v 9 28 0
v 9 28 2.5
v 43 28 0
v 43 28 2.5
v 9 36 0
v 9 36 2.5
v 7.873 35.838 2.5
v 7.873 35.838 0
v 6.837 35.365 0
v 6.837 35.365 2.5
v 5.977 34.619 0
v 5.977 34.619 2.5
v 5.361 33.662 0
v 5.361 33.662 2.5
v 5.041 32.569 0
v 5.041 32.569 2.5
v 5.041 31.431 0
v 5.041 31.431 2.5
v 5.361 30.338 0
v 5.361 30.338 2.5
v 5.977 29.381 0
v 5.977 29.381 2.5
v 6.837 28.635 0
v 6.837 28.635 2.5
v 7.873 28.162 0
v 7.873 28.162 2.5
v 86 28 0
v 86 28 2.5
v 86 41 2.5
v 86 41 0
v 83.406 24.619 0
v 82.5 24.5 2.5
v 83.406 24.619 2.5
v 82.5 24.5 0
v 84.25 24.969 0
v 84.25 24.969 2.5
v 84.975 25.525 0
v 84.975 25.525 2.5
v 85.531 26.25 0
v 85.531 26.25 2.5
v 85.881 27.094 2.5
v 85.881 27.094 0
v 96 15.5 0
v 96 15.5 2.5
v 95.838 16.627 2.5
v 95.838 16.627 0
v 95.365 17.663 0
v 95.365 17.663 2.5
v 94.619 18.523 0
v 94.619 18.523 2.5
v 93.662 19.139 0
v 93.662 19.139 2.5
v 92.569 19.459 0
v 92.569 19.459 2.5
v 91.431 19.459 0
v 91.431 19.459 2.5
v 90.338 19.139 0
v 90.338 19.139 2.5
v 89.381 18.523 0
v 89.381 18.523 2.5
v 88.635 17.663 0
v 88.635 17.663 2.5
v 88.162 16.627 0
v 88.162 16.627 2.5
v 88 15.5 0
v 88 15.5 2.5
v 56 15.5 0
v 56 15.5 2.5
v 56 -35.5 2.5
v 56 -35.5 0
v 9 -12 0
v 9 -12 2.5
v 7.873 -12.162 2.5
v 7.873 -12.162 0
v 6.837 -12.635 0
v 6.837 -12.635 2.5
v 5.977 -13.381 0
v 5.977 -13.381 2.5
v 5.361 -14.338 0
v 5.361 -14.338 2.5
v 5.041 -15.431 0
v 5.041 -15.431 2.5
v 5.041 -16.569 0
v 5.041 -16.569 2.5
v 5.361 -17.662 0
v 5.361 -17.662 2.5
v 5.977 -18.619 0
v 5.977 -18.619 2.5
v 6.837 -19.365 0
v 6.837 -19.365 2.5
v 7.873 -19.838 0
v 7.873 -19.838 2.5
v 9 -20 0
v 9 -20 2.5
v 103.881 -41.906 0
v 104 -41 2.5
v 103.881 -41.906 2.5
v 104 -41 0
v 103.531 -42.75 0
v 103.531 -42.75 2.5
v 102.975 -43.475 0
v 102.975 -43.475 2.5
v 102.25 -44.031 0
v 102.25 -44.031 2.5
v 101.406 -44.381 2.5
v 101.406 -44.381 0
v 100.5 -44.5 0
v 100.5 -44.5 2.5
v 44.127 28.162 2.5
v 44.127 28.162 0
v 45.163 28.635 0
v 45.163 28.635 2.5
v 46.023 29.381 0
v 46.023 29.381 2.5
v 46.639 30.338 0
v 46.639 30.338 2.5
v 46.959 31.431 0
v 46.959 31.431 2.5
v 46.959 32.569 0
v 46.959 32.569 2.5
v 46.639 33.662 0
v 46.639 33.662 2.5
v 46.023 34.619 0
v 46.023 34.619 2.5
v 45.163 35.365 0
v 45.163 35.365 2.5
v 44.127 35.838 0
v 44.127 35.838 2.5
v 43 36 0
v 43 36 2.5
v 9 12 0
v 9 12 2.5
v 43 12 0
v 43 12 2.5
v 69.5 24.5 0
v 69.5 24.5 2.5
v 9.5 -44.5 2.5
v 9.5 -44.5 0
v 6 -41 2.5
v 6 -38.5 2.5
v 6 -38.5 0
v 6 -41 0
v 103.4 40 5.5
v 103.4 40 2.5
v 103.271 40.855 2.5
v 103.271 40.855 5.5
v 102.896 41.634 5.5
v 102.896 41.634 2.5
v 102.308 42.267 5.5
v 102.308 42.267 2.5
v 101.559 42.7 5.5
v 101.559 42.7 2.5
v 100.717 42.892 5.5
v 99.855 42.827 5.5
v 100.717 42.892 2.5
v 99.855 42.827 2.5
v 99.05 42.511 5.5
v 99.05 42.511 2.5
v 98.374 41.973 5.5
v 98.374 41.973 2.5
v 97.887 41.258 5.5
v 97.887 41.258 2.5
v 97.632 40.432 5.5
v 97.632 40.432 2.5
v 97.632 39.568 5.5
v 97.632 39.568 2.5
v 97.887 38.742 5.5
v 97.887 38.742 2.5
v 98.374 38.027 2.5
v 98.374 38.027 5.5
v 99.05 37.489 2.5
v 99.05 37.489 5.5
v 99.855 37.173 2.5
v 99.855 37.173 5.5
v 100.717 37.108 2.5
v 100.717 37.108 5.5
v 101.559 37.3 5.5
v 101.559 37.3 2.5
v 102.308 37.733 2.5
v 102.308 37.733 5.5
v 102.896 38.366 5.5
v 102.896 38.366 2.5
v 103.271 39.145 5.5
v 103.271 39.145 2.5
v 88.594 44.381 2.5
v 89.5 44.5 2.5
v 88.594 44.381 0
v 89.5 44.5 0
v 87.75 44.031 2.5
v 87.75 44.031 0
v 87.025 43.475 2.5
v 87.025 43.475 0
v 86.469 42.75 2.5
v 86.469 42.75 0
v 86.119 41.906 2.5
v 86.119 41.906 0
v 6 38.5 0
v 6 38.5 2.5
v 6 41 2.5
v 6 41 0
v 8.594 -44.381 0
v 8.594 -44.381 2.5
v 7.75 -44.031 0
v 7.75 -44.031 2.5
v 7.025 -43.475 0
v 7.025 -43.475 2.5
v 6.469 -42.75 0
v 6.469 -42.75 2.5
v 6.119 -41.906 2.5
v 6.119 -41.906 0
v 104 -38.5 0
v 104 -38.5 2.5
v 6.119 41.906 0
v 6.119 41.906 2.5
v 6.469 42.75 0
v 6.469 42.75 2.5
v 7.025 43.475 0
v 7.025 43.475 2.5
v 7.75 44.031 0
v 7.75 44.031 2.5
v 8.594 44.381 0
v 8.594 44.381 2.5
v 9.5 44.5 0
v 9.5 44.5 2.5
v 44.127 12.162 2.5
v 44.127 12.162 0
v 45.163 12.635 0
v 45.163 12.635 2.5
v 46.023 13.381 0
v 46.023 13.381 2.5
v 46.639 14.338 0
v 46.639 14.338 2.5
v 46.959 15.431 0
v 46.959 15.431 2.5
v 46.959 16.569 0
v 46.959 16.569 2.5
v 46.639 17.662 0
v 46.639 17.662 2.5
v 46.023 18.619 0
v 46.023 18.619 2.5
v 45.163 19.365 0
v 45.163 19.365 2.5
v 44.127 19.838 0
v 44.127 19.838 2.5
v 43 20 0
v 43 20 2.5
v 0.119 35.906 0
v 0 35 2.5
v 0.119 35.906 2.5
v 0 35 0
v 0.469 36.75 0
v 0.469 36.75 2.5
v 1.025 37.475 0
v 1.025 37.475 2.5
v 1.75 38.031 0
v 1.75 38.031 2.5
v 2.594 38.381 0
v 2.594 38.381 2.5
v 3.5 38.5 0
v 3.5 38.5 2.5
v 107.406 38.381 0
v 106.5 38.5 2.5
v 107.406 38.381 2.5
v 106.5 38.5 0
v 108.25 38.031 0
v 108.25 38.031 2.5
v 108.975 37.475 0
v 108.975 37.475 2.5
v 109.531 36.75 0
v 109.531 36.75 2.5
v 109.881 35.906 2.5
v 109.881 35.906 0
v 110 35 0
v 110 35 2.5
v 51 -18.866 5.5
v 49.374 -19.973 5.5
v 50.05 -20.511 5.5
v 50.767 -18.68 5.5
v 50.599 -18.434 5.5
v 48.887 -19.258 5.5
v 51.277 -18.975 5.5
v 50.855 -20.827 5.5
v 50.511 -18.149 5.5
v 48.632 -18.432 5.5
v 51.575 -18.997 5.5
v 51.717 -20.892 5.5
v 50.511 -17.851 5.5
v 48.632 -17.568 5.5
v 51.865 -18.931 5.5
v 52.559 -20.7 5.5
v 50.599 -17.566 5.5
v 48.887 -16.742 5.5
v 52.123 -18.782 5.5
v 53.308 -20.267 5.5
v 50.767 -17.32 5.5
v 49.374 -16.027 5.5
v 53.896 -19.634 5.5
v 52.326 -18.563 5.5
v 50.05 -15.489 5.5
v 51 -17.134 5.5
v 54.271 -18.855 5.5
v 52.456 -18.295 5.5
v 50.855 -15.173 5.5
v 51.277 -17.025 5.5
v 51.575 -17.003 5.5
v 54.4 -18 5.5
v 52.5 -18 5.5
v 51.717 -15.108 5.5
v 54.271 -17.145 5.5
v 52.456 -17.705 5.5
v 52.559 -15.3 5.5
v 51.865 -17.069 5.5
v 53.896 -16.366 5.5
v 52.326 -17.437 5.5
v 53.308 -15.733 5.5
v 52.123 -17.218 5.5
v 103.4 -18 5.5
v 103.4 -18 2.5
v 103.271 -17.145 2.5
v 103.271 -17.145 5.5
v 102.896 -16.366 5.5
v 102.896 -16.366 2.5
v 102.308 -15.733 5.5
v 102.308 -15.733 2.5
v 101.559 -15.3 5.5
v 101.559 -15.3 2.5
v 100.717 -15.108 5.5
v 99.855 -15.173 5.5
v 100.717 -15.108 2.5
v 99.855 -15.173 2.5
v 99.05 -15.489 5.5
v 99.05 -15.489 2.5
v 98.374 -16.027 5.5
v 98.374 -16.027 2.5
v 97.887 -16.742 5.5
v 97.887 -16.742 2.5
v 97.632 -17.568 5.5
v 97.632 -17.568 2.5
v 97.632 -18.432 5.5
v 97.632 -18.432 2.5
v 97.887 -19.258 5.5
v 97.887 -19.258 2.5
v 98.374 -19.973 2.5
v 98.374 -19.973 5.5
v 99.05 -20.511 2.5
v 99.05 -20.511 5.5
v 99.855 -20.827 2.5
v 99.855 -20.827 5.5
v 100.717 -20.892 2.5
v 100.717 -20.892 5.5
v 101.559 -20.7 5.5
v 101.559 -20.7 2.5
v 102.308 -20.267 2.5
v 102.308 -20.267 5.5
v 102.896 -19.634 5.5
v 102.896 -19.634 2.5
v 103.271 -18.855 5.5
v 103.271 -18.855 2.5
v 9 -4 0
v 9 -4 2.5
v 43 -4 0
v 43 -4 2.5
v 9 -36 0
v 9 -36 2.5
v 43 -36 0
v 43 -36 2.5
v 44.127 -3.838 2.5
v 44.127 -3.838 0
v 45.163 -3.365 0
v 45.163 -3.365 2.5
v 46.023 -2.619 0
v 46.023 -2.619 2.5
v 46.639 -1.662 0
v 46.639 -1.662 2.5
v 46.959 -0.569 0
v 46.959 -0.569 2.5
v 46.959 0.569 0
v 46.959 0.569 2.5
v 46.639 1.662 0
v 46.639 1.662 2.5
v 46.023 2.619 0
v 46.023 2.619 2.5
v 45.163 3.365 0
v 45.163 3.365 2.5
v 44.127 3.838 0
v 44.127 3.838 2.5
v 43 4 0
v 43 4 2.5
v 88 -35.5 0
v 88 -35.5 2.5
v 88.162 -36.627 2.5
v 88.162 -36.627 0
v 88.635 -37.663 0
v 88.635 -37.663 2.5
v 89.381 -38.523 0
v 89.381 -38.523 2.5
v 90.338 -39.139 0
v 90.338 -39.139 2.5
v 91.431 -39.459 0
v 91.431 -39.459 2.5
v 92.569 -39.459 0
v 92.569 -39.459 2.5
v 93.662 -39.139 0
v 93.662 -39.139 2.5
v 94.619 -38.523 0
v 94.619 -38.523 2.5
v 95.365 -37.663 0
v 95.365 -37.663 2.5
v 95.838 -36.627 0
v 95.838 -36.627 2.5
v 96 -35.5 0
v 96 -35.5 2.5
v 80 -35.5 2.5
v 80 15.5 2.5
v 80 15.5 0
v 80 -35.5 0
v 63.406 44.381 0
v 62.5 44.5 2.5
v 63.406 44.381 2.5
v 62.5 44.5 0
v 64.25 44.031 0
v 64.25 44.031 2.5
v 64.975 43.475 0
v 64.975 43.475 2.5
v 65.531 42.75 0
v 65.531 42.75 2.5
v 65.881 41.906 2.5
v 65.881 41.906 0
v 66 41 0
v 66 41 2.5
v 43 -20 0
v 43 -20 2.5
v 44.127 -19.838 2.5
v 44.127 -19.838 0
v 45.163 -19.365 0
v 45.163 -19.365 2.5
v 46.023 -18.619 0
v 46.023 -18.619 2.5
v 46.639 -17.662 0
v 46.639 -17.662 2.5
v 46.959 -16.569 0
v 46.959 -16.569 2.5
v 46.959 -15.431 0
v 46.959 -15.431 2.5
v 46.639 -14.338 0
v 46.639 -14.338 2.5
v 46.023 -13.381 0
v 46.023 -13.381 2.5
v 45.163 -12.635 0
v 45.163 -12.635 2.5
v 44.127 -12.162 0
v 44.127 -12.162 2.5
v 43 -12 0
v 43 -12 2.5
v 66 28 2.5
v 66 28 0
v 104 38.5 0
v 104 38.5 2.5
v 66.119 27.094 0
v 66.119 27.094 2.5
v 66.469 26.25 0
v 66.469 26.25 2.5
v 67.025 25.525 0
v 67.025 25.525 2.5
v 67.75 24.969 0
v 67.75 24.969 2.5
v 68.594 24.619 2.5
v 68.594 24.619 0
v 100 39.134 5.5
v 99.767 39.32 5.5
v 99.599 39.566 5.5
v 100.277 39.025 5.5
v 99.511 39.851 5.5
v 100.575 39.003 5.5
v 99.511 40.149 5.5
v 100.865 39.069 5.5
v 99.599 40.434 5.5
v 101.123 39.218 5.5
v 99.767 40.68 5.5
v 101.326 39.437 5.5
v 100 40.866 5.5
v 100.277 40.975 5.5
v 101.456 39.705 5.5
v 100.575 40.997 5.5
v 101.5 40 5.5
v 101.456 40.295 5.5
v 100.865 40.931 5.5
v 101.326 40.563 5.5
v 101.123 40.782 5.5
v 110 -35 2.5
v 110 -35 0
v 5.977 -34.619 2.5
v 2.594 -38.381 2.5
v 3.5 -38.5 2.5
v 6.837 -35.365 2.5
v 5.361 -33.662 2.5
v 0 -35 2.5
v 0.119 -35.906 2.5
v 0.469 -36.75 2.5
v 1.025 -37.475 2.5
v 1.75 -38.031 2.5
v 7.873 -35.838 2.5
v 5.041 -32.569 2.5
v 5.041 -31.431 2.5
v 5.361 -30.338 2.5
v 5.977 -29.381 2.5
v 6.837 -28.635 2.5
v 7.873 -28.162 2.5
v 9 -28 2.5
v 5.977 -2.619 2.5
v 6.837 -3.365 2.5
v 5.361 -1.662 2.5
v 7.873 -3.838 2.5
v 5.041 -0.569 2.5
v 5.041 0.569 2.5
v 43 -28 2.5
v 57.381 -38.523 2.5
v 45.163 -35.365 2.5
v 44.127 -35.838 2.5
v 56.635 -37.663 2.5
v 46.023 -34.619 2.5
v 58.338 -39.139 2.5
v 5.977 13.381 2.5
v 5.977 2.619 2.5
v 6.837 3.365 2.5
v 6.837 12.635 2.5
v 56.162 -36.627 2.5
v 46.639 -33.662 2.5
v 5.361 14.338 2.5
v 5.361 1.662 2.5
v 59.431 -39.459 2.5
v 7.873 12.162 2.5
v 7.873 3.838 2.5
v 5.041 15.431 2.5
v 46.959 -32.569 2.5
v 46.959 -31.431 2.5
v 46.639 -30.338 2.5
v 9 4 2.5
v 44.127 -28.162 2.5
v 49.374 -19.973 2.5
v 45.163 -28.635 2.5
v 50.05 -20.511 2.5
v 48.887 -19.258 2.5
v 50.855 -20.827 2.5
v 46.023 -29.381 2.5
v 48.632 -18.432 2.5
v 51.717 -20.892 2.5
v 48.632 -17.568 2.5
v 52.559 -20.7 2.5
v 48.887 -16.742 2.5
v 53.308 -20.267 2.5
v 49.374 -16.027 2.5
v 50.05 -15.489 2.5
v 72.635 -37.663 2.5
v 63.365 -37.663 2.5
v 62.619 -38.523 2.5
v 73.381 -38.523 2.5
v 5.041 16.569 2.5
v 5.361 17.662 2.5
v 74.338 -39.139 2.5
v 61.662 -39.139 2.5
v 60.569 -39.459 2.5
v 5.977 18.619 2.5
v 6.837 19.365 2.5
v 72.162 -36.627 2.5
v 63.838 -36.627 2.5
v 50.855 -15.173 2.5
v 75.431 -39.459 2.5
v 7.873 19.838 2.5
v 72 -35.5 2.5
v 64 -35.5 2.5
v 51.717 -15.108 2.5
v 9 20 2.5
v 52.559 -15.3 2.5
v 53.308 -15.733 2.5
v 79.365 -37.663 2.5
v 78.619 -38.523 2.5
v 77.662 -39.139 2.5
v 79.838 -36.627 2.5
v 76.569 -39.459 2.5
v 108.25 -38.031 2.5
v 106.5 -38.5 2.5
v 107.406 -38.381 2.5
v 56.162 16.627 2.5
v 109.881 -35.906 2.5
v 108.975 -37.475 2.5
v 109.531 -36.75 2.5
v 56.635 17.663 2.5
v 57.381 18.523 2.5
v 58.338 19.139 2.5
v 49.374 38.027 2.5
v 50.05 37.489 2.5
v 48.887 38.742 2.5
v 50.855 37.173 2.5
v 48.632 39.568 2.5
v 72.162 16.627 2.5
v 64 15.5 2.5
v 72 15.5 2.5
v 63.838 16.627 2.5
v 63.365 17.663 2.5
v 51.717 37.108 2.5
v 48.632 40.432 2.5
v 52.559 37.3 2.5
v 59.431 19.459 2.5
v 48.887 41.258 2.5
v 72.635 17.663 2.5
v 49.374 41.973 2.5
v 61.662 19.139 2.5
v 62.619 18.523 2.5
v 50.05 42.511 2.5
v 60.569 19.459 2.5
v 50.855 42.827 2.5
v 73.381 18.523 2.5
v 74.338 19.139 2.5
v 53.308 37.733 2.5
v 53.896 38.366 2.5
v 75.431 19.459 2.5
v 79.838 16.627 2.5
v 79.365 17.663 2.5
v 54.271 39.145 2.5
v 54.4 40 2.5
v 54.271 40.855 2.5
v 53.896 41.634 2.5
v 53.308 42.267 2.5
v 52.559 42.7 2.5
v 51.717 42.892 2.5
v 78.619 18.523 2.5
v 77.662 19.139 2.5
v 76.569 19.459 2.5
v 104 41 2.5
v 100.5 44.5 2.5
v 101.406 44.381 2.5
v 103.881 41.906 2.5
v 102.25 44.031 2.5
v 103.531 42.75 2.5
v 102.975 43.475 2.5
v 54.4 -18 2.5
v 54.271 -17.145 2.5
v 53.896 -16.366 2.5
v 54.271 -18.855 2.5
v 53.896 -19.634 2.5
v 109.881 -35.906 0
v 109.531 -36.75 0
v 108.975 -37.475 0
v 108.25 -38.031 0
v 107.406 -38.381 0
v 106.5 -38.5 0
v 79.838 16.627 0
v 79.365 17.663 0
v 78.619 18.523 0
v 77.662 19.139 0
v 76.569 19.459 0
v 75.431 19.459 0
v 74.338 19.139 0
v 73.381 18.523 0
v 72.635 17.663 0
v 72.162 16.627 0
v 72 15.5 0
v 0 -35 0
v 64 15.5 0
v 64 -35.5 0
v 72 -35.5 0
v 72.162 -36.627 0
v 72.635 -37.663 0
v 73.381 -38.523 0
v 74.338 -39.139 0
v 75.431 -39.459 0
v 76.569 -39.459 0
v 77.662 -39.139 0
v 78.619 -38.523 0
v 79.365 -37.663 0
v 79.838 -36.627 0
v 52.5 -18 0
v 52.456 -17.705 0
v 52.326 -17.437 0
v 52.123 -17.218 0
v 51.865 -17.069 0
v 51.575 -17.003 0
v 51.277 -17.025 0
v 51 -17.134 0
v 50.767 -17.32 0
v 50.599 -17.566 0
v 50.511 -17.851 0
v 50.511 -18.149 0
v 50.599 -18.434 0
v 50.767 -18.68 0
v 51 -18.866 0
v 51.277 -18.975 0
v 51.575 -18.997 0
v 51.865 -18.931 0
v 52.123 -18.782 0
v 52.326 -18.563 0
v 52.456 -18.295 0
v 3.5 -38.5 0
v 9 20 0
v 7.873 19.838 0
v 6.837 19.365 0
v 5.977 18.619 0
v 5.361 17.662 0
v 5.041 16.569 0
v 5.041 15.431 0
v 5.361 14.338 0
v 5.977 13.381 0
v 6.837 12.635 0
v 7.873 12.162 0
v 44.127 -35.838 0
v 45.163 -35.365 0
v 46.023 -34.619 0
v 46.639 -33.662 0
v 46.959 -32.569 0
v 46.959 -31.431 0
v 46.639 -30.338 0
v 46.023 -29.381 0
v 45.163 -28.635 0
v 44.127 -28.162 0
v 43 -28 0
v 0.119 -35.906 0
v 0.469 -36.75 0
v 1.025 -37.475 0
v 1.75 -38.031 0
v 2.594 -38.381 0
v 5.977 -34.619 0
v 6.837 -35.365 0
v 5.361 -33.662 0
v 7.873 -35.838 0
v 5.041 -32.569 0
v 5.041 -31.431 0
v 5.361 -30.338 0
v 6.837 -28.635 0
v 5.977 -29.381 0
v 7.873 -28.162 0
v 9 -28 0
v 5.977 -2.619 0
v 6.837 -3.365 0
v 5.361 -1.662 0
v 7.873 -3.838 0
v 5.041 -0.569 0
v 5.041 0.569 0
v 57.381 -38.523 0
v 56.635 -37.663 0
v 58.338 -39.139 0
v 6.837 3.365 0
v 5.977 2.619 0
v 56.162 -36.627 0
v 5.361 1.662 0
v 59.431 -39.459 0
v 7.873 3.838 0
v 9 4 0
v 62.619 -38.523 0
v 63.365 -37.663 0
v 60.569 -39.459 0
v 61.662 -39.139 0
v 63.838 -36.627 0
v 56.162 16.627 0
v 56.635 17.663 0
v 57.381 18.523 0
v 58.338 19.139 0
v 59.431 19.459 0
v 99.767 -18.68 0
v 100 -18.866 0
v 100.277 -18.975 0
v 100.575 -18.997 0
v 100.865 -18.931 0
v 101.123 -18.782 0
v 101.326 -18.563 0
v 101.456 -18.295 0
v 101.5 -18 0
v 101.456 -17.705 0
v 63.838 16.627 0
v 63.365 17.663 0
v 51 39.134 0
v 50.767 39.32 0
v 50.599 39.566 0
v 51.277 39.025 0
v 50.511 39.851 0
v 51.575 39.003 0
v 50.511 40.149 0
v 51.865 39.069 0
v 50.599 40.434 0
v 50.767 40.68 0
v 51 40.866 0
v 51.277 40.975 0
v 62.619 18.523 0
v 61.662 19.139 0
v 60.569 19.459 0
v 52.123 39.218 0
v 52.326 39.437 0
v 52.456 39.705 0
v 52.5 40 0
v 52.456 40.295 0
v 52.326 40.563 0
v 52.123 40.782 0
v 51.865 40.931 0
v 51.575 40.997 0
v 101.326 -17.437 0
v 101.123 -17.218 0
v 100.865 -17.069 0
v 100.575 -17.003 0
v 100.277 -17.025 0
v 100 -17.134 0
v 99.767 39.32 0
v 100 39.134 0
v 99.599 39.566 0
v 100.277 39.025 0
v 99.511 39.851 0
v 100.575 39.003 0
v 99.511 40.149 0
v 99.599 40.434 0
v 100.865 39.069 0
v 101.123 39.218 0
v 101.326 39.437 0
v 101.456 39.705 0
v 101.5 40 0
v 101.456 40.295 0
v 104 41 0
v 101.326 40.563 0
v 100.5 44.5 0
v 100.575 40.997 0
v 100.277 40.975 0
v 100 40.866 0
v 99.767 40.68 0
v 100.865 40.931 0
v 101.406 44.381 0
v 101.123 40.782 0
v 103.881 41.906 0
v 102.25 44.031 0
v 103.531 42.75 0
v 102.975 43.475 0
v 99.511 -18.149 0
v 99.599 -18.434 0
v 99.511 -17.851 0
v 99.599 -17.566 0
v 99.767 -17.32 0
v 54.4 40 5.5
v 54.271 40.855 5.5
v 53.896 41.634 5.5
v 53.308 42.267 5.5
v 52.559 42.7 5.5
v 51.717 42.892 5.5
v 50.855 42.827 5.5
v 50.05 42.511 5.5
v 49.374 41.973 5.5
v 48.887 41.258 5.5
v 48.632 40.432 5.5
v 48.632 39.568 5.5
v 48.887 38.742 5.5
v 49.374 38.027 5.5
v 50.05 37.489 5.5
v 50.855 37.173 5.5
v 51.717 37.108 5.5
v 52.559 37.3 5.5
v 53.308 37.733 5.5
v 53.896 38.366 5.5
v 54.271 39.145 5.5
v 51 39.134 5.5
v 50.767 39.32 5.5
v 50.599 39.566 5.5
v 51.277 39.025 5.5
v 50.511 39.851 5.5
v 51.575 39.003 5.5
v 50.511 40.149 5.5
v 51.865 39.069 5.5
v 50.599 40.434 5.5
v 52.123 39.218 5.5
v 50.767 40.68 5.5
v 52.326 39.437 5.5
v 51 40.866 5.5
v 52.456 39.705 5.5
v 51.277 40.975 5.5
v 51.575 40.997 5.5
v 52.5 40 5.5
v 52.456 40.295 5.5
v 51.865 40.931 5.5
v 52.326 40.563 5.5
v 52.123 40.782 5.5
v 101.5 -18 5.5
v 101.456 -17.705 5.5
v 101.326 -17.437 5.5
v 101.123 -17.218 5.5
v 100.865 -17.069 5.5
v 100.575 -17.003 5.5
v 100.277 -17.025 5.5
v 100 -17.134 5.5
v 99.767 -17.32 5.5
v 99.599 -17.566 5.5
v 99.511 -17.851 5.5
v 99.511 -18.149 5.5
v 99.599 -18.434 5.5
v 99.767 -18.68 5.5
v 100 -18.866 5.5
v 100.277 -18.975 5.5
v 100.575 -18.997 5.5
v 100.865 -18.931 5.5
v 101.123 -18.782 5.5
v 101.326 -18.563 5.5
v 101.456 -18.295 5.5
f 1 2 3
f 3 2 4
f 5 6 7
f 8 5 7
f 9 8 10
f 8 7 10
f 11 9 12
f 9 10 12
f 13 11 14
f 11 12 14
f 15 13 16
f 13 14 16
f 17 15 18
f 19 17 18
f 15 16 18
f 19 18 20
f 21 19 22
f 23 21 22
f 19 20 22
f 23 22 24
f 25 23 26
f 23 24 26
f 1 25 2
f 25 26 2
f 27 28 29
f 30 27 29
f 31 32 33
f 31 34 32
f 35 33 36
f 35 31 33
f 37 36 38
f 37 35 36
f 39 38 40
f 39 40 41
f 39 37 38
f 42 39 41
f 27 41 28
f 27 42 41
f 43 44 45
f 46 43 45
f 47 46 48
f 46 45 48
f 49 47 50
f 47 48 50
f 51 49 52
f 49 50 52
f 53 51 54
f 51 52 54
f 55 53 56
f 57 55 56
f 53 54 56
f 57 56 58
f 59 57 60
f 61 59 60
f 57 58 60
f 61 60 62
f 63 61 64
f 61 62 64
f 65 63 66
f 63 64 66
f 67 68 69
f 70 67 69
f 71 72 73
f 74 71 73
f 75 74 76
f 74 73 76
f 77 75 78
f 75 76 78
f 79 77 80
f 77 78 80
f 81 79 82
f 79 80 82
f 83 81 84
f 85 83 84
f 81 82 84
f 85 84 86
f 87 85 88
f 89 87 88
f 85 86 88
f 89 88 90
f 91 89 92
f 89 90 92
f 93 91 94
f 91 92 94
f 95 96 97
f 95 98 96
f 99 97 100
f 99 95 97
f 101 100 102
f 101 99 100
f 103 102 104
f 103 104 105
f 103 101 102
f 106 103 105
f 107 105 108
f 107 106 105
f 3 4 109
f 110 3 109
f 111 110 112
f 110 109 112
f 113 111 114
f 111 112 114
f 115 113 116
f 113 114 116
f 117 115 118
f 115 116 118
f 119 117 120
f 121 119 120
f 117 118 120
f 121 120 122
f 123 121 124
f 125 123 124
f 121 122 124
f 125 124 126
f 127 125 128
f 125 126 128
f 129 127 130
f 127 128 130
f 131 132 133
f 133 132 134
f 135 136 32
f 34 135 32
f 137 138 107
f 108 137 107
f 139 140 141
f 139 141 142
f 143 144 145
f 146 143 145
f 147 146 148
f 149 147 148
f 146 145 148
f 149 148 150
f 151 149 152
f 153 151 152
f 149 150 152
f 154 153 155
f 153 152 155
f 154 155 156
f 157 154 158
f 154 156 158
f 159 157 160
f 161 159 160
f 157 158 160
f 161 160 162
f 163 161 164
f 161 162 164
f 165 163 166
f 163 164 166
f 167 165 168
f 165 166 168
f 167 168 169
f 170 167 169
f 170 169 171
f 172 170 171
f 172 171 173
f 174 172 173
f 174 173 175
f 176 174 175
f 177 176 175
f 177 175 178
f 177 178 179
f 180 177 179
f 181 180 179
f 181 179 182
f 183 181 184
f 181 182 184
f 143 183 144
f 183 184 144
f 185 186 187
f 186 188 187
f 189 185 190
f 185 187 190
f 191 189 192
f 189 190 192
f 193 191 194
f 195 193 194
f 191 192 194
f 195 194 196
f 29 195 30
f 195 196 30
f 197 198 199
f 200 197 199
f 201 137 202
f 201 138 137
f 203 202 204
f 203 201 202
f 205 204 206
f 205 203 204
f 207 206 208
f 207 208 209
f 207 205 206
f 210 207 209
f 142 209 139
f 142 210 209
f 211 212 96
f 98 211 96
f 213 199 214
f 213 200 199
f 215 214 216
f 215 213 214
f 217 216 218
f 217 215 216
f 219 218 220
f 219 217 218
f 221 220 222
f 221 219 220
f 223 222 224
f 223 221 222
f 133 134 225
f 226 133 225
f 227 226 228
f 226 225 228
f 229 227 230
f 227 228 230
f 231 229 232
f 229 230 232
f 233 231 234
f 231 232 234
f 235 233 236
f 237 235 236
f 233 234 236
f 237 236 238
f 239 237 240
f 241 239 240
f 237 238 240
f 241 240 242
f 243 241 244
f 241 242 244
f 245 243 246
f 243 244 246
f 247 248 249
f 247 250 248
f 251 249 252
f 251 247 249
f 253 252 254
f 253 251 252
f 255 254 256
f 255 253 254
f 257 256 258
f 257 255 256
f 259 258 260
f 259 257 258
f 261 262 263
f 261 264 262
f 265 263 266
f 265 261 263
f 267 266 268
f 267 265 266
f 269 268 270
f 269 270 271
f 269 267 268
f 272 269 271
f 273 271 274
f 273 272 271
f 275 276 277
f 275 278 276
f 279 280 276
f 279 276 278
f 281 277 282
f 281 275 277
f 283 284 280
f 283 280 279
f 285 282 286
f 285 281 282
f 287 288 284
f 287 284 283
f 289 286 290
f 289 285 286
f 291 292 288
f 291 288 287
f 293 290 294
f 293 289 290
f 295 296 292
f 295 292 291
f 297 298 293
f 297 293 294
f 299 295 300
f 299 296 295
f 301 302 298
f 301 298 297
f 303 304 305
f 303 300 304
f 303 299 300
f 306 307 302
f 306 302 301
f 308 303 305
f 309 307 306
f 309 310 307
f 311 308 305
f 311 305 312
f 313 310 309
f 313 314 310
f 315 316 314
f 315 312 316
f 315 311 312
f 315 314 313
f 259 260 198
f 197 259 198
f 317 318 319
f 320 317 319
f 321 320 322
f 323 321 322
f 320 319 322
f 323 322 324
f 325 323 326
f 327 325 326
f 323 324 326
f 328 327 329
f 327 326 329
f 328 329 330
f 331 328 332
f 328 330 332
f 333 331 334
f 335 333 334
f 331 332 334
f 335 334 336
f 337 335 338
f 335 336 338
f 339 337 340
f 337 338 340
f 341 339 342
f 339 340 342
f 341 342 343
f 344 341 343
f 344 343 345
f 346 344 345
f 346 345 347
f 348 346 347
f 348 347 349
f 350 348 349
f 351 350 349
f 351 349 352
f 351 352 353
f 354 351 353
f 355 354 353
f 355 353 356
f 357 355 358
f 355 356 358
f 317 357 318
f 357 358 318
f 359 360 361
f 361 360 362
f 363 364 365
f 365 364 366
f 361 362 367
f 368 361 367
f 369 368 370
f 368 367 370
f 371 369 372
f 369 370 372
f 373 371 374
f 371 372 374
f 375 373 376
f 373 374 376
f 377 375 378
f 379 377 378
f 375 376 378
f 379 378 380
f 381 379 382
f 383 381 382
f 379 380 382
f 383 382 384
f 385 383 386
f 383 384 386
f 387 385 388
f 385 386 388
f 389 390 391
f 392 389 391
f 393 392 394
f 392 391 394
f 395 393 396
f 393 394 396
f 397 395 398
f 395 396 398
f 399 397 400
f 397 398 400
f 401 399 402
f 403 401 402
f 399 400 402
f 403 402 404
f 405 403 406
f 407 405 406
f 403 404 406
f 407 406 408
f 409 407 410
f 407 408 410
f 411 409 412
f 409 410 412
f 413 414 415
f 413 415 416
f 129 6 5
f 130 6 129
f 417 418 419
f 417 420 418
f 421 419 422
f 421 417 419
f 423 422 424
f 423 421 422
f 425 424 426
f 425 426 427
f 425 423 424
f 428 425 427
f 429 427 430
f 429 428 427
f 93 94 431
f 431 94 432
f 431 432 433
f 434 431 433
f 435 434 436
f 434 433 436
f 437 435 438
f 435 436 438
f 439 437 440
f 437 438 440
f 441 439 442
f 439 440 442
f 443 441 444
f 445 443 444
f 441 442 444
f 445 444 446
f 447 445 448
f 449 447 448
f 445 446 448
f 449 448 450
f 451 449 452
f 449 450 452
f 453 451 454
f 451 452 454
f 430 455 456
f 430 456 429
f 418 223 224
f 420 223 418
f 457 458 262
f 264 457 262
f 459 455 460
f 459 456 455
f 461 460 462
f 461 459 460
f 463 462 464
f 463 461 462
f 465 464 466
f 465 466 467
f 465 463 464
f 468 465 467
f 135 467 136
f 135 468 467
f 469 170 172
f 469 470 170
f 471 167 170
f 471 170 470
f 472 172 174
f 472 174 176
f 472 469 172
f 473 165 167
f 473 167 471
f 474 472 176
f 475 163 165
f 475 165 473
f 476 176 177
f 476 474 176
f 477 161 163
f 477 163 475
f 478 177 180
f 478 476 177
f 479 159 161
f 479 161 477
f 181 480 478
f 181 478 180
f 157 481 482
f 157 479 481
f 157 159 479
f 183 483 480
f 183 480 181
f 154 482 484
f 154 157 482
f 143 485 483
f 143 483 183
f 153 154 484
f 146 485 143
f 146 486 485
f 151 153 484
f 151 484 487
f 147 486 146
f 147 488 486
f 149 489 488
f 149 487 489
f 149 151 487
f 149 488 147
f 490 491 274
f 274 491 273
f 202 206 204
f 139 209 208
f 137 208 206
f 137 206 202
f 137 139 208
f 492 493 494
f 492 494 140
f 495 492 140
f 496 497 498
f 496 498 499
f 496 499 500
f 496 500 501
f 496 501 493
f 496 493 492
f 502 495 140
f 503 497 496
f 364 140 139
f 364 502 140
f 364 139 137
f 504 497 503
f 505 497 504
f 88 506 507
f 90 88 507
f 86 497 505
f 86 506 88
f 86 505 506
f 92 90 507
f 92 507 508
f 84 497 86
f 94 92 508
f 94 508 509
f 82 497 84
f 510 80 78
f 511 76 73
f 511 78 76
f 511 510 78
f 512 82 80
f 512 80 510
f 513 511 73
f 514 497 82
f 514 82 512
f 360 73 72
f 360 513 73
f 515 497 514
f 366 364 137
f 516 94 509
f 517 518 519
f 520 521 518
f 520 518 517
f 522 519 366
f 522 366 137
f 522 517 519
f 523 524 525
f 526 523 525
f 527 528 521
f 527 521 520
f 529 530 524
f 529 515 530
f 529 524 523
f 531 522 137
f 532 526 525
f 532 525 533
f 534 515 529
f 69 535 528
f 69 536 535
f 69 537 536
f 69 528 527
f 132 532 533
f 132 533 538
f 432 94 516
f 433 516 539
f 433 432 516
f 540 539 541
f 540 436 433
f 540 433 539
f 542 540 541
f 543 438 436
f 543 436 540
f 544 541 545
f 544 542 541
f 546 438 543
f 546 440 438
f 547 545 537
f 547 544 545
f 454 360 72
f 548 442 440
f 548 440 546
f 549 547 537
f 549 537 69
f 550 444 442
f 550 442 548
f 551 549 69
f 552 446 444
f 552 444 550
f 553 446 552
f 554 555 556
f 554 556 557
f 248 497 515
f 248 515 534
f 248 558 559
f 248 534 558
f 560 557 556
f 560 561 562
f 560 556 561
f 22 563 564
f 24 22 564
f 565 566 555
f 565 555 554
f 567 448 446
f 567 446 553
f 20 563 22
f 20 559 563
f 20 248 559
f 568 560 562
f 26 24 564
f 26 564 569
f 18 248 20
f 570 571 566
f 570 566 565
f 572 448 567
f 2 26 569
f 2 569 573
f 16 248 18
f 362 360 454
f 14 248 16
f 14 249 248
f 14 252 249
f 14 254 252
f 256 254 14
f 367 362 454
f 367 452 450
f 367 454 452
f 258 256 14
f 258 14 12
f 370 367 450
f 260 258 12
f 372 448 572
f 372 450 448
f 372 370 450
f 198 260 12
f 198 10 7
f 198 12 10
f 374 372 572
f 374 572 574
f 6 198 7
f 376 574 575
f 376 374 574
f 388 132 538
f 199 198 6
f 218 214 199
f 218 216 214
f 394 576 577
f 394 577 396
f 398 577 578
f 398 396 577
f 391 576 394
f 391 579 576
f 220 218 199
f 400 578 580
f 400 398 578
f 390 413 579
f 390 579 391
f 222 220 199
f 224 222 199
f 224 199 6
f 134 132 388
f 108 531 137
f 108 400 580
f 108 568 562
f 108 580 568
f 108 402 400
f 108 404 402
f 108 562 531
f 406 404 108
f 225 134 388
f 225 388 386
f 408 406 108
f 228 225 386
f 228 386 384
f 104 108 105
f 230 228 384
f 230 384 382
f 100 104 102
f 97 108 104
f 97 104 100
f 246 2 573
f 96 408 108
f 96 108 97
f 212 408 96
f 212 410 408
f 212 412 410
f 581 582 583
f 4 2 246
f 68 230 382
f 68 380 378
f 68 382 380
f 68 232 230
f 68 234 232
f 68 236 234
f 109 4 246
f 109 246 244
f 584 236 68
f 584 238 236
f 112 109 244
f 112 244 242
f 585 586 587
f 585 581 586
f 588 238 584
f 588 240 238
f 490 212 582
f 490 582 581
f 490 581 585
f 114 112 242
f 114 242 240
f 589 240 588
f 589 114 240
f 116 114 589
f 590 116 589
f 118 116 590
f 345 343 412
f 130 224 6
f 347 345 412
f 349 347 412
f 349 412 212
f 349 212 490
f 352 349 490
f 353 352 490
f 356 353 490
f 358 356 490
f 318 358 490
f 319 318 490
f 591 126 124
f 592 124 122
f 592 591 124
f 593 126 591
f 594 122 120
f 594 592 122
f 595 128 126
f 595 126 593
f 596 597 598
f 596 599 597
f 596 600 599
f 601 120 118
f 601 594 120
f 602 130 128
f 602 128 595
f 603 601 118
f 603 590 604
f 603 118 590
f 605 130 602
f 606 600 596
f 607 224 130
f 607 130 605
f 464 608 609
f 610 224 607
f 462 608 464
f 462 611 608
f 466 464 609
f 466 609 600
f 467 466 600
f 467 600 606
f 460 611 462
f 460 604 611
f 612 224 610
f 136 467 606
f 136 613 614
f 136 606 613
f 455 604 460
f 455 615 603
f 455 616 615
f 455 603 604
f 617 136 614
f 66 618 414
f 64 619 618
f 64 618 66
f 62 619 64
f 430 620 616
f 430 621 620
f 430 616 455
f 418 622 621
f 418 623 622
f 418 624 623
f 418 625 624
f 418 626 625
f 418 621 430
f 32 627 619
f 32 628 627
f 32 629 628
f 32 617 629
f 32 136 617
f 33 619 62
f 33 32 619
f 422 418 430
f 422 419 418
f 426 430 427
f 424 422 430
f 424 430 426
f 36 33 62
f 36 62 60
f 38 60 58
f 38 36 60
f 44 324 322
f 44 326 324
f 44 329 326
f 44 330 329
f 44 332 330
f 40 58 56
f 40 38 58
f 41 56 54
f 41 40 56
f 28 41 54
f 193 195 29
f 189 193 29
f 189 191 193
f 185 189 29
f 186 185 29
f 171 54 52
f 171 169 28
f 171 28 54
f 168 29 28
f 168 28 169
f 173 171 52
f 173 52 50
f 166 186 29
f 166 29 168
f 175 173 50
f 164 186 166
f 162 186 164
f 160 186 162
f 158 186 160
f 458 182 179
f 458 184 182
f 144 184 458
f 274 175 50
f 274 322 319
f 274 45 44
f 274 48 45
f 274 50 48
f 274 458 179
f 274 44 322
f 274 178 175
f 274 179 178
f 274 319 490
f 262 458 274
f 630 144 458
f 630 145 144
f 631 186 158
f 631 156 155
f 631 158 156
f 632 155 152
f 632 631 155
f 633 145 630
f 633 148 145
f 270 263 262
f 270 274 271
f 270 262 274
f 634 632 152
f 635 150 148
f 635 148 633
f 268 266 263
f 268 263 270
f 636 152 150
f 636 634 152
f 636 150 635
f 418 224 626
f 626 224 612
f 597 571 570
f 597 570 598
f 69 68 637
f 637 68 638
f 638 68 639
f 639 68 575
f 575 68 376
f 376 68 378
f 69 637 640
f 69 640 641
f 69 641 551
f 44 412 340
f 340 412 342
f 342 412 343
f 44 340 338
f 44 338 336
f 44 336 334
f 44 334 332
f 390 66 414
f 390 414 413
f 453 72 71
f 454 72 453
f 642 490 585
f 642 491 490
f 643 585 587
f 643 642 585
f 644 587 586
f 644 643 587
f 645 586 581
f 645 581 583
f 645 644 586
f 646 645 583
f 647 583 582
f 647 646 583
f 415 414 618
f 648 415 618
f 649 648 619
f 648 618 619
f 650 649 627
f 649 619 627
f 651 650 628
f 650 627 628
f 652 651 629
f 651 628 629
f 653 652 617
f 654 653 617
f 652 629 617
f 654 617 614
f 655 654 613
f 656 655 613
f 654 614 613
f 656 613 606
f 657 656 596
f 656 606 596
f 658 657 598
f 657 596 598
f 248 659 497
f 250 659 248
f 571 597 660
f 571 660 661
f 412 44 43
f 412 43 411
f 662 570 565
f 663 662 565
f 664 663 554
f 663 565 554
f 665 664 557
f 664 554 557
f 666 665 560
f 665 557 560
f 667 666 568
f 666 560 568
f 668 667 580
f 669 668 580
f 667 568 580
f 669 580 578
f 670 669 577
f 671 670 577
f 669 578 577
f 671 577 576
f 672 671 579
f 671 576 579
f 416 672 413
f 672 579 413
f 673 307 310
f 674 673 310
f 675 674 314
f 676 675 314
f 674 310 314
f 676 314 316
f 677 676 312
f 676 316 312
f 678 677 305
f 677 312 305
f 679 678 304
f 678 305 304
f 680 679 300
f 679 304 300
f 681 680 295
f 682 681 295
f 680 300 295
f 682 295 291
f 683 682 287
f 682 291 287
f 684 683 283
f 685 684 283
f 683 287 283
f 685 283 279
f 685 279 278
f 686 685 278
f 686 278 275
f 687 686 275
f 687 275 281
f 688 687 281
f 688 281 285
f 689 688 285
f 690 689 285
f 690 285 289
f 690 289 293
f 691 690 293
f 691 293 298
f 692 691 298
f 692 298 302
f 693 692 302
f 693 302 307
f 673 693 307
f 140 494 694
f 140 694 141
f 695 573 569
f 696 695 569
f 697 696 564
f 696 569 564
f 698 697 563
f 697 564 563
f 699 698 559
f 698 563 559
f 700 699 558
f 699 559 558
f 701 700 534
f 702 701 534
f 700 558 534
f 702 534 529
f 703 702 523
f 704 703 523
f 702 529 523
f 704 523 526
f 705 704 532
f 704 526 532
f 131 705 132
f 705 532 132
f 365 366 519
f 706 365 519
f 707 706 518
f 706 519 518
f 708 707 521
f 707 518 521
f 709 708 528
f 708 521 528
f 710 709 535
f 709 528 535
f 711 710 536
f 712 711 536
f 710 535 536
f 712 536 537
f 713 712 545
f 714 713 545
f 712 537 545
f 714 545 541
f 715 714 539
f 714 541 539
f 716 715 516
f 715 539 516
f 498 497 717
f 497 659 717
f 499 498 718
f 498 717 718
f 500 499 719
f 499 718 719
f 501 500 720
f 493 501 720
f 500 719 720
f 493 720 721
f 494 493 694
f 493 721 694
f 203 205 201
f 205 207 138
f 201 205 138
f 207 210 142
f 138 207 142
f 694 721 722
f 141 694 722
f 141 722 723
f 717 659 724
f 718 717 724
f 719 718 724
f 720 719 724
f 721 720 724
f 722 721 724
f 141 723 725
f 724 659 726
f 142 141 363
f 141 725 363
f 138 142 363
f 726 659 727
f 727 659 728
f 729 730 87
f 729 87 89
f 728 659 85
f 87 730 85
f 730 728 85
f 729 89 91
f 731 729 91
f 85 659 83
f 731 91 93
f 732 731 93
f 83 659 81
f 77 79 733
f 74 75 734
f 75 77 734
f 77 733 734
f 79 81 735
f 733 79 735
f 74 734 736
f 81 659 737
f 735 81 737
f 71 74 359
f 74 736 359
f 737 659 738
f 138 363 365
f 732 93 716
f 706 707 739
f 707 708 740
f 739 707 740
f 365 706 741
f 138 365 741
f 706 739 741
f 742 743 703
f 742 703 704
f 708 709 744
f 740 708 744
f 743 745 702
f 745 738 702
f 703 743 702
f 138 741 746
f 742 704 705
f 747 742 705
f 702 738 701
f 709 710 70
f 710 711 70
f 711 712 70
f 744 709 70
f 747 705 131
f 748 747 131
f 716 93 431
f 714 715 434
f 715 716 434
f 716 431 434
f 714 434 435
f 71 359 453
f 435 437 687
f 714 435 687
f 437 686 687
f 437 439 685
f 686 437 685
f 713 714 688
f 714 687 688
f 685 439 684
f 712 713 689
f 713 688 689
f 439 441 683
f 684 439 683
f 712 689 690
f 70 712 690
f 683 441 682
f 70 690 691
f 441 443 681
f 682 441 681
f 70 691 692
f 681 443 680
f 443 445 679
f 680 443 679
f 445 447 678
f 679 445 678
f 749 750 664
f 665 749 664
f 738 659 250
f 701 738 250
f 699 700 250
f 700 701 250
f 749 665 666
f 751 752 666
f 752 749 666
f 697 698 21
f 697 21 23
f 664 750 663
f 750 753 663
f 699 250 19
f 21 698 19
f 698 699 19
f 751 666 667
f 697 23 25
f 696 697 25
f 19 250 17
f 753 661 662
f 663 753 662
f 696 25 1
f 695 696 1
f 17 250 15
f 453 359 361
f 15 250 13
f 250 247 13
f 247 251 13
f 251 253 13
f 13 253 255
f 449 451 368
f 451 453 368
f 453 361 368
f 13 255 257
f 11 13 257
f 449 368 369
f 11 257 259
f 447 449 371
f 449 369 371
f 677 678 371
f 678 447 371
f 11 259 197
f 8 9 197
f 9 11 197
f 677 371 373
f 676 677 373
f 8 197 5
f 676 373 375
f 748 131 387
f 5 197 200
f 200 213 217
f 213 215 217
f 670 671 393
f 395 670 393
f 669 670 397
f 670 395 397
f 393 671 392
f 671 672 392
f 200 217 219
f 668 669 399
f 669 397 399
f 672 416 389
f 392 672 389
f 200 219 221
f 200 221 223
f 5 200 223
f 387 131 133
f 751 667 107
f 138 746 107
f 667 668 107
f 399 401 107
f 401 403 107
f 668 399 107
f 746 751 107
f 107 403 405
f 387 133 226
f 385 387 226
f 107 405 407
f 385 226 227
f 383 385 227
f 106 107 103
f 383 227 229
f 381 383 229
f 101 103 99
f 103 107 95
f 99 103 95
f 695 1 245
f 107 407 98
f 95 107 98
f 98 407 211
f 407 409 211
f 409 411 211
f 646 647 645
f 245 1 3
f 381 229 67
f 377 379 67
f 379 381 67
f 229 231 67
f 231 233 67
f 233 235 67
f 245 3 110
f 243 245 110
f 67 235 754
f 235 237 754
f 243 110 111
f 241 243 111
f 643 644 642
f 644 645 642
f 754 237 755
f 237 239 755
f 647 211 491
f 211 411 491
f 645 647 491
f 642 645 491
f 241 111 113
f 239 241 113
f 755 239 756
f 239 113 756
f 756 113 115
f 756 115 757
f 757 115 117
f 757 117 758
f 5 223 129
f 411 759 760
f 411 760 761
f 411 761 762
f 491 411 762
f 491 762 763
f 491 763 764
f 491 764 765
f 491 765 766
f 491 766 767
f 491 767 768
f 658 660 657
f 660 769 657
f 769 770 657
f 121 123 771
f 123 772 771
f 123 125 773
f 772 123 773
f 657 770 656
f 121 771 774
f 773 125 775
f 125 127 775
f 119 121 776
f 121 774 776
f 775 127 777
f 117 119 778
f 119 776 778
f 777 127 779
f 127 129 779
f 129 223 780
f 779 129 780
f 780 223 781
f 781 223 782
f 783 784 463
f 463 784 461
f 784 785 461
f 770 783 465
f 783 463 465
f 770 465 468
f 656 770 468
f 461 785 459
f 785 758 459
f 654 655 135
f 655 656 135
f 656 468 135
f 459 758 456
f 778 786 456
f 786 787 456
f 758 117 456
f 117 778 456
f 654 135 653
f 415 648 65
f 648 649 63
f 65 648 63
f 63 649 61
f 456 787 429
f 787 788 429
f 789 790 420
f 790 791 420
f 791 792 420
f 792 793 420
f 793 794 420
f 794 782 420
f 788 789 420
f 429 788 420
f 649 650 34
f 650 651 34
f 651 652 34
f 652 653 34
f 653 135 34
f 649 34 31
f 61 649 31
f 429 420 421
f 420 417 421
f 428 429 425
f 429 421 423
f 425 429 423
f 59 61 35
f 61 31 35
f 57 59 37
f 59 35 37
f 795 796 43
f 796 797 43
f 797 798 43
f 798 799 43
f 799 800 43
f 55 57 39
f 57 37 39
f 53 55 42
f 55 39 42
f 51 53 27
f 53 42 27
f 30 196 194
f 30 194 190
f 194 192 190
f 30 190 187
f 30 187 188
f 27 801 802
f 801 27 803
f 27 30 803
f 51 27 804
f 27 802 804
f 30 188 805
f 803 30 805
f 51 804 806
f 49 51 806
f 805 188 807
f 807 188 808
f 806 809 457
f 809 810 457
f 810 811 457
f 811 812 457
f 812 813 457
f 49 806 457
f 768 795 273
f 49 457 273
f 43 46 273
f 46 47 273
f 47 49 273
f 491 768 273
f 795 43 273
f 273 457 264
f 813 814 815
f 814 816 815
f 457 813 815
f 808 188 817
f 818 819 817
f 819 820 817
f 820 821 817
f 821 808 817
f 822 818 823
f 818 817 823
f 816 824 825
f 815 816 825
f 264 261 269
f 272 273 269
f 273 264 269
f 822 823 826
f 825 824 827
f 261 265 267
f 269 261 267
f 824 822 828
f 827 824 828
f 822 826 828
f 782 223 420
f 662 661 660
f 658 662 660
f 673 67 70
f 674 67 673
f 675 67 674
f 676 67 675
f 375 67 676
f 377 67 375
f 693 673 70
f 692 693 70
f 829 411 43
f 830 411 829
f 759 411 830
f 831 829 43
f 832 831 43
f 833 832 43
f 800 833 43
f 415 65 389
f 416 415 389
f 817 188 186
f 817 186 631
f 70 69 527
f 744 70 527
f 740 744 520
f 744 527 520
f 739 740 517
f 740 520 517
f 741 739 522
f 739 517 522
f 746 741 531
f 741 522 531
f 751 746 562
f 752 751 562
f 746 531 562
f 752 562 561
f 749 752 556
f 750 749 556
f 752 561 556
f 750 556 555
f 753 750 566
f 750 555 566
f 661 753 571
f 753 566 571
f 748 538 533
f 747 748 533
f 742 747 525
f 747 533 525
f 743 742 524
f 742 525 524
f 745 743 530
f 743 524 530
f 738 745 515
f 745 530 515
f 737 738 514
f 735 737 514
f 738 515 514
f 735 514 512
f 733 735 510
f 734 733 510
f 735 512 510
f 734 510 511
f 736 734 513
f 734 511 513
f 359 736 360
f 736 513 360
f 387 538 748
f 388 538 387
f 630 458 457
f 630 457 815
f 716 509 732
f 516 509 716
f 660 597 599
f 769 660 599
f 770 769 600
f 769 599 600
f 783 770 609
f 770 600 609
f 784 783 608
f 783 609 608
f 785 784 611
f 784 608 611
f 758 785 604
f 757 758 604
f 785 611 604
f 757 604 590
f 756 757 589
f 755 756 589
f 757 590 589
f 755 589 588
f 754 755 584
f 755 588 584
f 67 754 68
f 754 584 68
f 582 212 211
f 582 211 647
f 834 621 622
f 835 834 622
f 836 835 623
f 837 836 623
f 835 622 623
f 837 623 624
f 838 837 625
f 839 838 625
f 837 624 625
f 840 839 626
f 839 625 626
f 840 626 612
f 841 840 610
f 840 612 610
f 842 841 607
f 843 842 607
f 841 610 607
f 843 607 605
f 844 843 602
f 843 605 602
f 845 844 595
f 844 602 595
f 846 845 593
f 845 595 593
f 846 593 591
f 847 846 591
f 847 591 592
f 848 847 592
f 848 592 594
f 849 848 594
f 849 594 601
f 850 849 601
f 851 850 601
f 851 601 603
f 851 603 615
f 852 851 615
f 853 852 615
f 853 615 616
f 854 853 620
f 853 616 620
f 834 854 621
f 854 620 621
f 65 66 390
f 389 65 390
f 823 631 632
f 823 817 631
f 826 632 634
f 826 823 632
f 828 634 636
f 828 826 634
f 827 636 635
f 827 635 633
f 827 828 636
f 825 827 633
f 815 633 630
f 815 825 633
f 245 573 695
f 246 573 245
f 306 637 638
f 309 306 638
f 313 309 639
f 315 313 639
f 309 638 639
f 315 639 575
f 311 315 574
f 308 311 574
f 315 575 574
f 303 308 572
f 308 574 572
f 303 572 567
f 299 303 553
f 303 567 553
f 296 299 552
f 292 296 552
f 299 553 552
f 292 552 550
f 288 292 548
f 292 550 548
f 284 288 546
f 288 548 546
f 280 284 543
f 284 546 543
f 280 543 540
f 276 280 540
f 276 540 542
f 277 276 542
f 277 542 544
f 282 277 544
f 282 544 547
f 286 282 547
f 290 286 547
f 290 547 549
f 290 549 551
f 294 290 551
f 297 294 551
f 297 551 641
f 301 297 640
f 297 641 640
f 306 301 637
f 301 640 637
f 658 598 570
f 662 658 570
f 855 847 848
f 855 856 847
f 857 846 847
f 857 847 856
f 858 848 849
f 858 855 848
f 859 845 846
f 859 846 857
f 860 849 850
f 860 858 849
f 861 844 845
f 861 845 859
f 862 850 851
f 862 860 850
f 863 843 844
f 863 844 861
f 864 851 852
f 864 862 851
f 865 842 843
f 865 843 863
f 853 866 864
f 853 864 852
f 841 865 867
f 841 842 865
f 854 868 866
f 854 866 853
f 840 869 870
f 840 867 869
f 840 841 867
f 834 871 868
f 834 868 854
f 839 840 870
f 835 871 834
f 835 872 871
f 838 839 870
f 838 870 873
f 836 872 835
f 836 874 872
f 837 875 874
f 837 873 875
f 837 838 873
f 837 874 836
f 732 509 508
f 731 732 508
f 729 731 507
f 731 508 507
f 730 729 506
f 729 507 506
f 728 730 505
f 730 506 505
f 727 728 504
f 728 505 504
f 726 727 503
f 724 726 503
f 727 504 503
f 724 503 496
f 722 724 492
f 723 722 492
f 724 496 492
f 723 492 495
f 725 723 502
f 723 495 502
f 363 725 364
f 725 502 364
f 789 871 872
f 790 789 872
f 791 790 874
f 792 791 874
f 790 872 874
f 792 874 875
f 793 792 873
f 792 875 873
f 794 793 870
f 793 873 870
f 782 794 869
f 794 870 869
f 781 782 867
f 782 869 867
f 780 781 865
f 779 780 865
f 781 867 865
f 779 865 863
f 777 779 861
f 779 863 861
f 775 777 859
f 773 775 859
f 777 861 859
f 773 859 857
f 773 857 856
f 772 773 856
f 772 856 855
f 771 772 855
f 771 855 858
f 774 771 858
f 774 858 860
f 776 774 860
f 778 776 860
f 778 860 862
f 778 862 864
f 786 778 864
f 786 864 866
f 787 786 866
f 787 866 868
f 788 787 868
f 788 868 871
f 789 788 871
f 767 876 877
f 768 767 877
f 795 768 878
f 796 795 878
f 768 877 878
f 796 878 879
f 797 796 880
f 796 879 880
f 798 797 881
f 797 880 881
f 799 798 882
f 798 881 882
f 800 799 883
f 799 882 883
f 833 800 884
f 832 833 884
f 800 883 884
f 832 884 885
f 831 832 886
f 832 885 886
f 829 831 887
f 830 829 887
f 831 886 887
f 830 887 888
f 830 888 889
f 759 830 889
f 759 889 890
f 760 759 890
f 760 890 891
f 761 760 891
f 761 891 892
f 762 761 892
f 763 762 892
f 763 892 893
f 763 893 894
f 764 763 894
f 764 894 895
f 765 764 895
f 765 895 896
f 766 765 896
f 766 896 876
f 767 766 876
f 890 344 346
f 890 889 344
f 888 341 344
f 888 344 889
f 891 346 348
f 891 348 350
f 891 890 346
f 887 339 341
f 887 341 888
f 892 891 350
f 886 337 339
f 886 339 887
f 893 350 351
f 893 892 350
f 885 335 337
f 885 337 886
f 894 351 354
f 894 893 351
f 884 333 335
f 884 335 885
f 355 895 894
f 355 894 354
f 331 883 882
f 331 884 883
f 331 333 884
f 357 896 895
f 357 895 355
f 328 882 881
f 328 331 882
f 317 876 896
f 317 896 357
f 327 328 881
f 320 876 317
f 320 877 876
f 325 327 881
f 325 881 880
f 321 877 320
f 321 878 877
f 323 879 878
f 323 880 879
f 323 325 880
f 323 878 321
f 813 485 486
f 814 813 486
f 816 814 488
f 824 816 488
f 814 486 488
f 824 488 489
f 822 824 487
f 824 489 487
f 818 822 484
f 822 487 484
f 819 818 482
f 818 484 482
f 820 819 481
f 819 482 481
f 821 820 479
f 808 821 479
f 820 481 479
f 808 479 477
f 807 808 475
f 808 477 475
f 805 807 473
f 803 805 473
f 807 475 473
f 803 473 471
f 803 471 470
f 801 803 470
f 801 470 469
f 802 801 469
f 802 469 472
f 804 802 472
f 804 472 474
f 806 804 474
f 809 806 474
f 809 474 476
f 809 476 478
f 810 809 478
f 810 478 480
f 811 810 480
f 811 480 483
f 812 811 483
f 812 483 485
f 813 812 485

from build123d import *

# Parameters (mm, degrees)
SKETCH_W                           = 110
SKETCH_H                           = 89
PAD_DEPTH                          = 2.5
SKETCH001_R                        = 2.9
PAD001_DEPTH                       = 3
SKETCH002_R                        = 1
POCKET_DEPTH                       = 5.501
SKETCH003_W                        = 20
SKETCH003_H                        = 20
POCKET001_DEPTH                    = 2.501
POCKET002_DEPTH                    = 285.705873
POCKET002_LINEARPATTERN_2_DEPTH    = 285.705873
LINEARPATTERN001_COUNT             = 2
LINEARPATTERN001_PITCH             = 16
POCKET003_DEPTH                    = 285.705873
POCKET003_LINEARPATTERN002_2_DEPTH = 285.705873
POCKET003_LINEARPATTERN002_3_DEPTH = 285.705873
LINEARPATTERN003_COUNT             = 3
LINEARPATTERN003_PITCH             = 16
FILLET_R                           = 3.5
SKETCH006_W                        = 6
SKETCH006_H                        = 6
POCKET004_DEPTH                    = 285.705873
FILLET001_R                        = 3.5


with BuildPart() as part:
    # Sketch → Pad (new body)
    with BuildSketch(Plane.XY):
        with Locations((55, 0)):
            Rectangle(SKETCH_W, SKETCH_H)
    extrude(amount=PAD_DEPTH)

    # Sketch001 (on Face6 of Pad) → Pad001 (join)
    with BuildSketch(Plane.XY.offset(2.5)):
        with Locations((100.5, 40)):
            Circle(SKETCH001_R)
        with Locations((100.5, -18)):
            Circle(SKETCH001_R)
        with Locations((51.5, 40)):
            Circle(SKETCH001_R)
        with Locations((51.5, -18)):
            Circle(SKETCH001_R)
    extrude(amount=PAD001_DEPTH)

    # Sketch002 (on Face13 of Pad001) → Pocket (cut, through all)
    with BuildSketch(Plane.XY.offset(5.5)):
        with Locations((51.5, 40)):
            Circle(SKETCH002_R)
        with Locations((100.5, 40)):
            Circle(SKETCH002_R)
        with Locations((51.5, -18)):
            Circle(SKETCH002_R)
        with Locations((100.5, -18)):
            Circle(SKETCH002_R)
    extrude(amount=-POCKET_DEPTH, mode=Mode.SUBTRACT)

    # Sketch003 → Pocket001 (cut, through all)
    with BuildSketch(Plane.XY.offset(2.5)):
        with Locations((76, 34.5)):
            Rectangle(SKETCH003_W, SKETCH003_H)
    extrude(amount=-POCKET001_DEPTH, mode=Mode.SUBTRACT)

    # Sketch004 (on Face5 of Pocket001) → Pocket002 (cut, through all)
    with BuildSketch(Plane.XY.offset(2.5)):
        with BuildLine():
            ThreePointArc((80, 15.5), (76, 19.5), (72, 15.5))
            Line((72, 15.5), (72, -35.5))
            ThreePointArc((72, -35.5), (76, -39.5), (80, -35.5))
            Line((80, 15.5), (80, -35.5))
        make_face()
    pocket002 = extrude(amount=-POCKET002_DEPTH, mode=Mode.SUBTRACT)

    # Sketch004 LinearPattern 2 → Pocket002 LinearPattern 2 (cut, through all)
    with BuildSketch(Plane(origin=(16, 0, 2.5), x_dir=(1, 0, 0), z_dir=(0, 0, 1))):
        with BuildLine():
            ThreePointArc((80, 15.5), (76, 19.5), (72, 15.5))
            Line((72, 15.5), (72, -35.5))
            ThreePointArc((72, -35.5), (76, -39.5), (80, -35.5))
            Line((80, 15.5), (80, -35.5))
        make_face()
    pocket002_linearpattern_2 = extrude(amount=-POCKET002_LINEARPATTERN_2_DEPTH, mode=Mode.SUBTRACT)

    # LinearPattern001: Pocket002, Pocket002 LinearPattern 2 ×2
    with Locations(*[(-i * LINEARPATTERN001_PITCH, 0, 0) for i in range(1, LINEARPATTERN001_COUNT)]):
        add(pocket002, mode=Mode.SUBTRACT)
        add(pocket002_linearpattern_2, mode=Mode.SUBTRACT)

    # Sketch005 (on Face5 of MultiTransform) → Pocket003 (cut, through all)
    with BuildSketch(Plane.XY.offset(2.5)):
        with BuildLine():
            ThreePointArc((9, 4), (5, 0), (9, -4))
            Line((9, -4), (43, -4))
            ThreePointArc((43, -4), (47, 0), (43, 4))
            Line((9, 4), (43, 4))
        make_face()
    pocket003 = extrude(amount=-POCKET003_DEPTH, mode=Mode.SUBTRACT)

    # Sketch005 LinearPattern002 2 → Pocket003 LinearPattern002 2 (cut, through all)
    with BuildSketch(Plane(origin=(0, 16, 2.5), x_dir=(1, 0, 0), z_dir=(0, 0, 1))):
        with BuildLine():
            ThreePointArc((9, 4), (5, 0), (9, -4))
            Line((9, -4), (43, -4))
            ThreePointArc((43, -4), (47, 0), (43, 4))
            Line((9, 4), (43, 4))
        make_face()
    pocket003_linearpattern002_2 = extrude(amount=-POCKET003_LINEARPATTERN002_2_DEPTH, mode=Mode.SUBTRACT)

    # Sketch005 LinearPattern002 3 → Pocket003 LinearPattern002 3 (cut, through all)
    with BuildSketch(Plane(origin=(0, 32, 2.5), x_dir=(1, 0, 0), z_dir=(0, 0, 1))):
        with BuildLine():
            ThreePointArc((9, 4), (5, 0), (9, -4))
            Line((9, -4), (43, -4))
            ThreePointArc((43, -4), (47, 0), (43, 4))
            Line((9, 4), (43, 4))
        make_face()
    pocket003_linearpattern002_3 = extrude(amount=-POCKET003_LINEARPATTERN002_3_DEPTH, mode=Mode.SUBTRACT)

    # LinearPattern003: Pocket003, Pocket003 LinearPattern002 2, Pocket003 LinearPattern002 3 ×3
    with Locations(*[(0, -i * LINEARPATTERN003_PITCH, 0) for i in range(1, LINEARPATTERN003_COUNT)]):
        add(pocket003, mode=Mode.SUBTRACT)
        add(pocket003_linearpattern002_2, mode=Mode.SUBTRACT)
        add(pocket003_linearpattern002_3, mode=Mode.SUBTRACT)

    # Fillet
    fillet_edges = [part.edges().sort_by_distance(p)[0] for p in [
        (110, 44.5, 1.25),
        (66, 44.5, 1.25),
        (66, 24.5, 1.25),
        (110, -44.5, 1.25),
        (86, 44.5, 1.25),
        (86, 24.5, 1.25),
        (0, 44.5, 1.25),
        (0, -44.5, 1.25),
    ]]
    fillet(fillet_edges, radius=FILLET_R)

    # Sketch006 (on Face5 of Fillet) → Pocket004 (cut, through all)
    with BuildSketch(Plane.XY.offset(2.5)):
        with Locations((3, 41.5)):
            Rectangle(SKETCH006_W, SKETCH006_H)
        with Locations((107, 41.5)):
            Rectangle(SKETCH006_W, SKETCH006_H)
    pocket004 = extrude(amount=-POCKET004_DEPTH, mode=Mode.SUBTRACT)

    # Mirrored: Pocket004 across XZ
    add(pocket004.mirror(Plane.XZ), mode=Mode.SUBTRACT)

    # Fillet001
    fillet001_edges = [part.edges().sort_by_distance(p)[0] for p in [
        (6, 44.5, 1.25),
        (0, 38.5, 1.25),
        (104, 44.5, 1.25),
        (110, 38.5, 1.25),
        (110, -38.5, 1.25),
        (104, -44.5, 1.25),
        (6, -44.5, 1.25),
        (0, -38.5, 1.25),
    ]]
    fillet(fillet001_edges, radius=FILLET001_R)


solid = part.part
